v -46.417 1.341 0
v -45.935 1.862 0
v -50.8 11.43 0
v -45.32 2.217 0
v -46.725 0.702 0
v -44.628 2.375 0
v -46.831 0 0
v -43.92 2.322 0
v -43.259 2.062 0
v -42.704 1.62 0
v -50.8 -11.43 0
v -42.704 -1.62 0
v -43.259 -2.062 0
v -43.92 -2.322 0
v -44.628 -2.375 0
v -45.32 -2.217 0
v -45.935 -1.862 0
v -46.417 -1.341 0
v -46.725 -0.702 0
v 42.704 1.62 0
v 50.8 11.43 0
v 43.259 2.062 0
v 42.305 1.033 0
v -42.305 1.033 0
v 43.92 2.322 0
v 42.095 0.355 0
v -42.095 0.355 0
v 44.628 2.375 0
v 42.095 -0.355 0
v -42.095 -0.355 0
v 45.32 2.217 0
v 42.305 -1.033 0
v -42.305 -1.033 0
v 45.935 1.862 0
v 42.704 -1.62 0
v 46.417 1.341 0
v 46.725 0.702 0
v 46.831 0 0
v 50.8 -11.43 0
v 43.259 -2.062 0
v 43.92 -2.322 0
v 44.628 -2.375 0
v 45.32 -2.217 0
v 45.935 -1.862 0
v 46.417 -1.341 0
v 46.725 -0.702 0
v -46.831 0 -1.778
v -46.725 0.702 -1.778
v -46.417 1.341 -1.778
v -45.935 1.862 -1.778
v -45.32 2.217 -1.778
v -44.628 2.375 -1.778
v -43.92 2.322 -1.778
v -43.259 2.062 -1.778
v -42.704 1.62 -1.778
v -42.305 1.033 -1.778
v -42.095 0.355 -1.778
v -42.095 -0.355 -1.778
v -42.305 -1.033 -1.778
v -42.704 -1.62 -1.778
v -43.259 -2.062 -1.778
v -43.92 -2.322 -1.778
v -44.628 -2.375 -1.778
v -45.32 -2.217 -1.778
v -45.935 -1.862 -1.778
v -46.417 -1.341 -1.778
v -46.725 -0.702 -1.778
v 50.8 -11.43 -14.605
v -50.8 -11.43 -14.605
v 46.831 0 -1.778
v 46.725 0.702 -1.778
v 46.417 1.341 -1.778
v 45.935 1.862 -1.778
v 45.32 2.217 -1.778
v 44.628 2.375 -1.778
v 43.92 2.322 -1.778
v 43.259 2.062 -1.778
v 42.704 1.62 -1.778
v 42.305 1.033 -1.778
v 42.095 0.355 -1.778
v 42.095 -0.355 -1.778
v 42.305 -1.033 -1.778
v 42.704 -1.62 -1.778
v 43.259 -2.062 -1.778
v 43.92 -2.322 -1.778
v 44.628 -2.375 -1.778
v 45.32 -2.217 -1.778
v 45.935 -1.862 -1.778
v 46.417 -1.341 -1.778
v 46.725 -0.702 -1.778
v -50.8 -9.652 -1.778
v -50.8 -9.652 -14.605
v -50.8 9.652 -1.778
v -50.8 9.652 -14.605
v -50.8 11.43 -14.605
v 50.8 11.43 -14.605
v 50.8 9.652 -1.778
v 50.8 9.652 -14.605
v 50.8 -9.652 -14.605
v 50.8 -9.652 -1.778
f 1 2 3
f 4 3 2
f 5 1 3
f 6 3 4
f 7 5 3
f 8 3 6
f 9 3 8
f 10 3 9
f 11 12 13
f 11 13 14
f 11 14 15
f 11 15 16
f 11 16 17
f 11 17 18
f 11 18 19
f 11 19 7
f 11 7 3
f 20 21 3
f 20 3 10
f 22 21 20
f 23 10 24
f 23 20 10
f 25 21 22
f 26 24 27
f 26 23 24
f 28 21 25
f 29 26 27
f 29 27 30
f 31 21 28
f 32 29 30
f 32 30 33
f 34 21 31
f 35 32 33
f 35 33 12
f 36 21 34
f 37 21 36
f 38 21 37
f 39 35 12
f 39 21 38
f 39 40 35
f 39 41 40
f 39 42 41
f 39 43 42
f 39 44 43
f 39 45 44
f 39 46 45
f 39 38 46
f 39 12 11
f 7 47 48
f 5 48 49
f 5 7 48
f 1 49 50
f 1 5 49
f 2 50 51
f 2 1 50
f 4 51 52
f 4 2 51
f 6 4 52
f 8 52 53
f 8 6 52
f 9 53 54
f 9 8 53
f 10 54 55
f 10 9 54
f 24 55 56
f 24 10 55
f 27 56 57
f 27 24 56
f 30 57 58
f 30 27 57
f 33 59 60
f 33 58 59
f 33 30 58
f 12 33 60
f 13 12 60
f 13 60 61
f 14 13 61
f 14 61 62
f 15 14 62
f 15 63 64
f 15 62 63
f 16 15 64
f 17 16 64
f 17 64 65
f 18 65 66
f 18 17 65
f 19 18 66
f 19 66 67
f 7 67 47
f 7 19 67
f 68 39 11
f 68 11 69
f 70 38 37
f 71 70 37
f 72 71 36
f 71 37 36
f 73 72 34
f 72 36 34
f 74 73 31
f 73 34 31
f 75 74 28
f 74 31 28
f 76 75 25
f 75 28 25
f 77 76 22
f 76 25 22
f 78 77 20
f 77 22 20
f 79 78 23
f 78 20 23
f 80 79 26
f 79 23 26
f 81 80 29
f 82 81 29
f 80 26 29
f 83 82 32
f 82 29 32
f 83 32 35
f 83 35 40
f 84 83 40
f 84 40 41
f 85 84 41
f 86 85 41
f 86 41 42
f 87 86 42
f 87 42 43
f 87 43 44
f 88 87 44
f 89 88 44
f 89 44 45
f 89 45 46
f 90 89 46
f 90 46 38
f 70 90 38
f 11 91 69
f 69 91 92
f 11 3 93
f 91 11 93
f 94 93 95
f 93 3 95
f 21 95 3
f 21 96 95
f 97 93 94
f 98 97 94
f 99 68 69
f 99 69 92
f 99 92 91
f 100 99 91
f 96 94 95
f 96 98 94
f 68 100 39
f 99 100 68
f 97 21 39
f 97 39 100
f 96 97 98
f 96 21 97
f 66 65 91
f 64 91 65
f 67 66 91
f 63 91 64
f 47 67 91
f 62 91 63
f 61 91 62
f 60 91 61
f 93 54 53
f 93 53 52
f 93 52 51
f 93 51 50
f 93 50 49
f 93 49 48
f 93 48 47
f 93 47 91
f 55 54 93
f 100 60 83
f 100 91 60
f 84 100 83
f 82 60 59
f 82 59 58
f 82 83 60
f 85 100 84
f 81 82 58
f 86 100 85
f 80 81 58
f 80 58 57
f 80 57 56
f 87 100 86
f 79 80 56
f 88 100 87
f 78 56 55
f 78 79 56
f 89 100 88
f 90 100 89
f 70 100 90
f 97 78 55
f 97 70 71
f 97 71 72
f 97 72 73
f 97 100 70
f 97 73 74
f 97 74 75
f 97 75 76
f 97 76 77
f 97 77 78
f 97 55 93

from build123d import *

# Parameters (mm, degrees)
BOSS_EXTRUDE1_DEPTH = 50.8
SKETCH3_R           = 2.38125
CUT_EXTRUDE1_DEPTH  = 15.605


with BuildPart() as part:
    # Sketch1 → Boss-Extrude1 (new body, symmetric)
    with BuildSketch(Plane(origin=(0, 0, 0), x_dir=(0, 0, -1), z_dir=(1, 0, 0))):
        Polygon((0, 11.43), (0, -11.43), (14.605, -11.43), (14.605, -9.652), (1.778, -9.652), (1.778, 9.652), (14.605, 9.652), (14.605, 11.43), align=None)
    extrude(amount=BOSS_EXTRUDE1_DEPTH, both=True)

    # Sketch3 → Cut-Extrude1 (cut, through all)
    with BuildSketch(Plane.XY):
        with Locations((44.45, 0)):
            Circle(SKETCH3_R)
    cut_extrude1 = extrude(amount=-CUT_EXTRUDE1_DEPTH, mode=Mode.SUBTRACT)

    # Mirror1: Cut-Extrude1 across plane
    add(cut_extrude1.mirror(Plane(origin=(0, 0, 0), x_dir=(0, 0, 1), z_dir=(1, 0, 0))), mode=Mode.SUBTRACT)


solid = part.part
